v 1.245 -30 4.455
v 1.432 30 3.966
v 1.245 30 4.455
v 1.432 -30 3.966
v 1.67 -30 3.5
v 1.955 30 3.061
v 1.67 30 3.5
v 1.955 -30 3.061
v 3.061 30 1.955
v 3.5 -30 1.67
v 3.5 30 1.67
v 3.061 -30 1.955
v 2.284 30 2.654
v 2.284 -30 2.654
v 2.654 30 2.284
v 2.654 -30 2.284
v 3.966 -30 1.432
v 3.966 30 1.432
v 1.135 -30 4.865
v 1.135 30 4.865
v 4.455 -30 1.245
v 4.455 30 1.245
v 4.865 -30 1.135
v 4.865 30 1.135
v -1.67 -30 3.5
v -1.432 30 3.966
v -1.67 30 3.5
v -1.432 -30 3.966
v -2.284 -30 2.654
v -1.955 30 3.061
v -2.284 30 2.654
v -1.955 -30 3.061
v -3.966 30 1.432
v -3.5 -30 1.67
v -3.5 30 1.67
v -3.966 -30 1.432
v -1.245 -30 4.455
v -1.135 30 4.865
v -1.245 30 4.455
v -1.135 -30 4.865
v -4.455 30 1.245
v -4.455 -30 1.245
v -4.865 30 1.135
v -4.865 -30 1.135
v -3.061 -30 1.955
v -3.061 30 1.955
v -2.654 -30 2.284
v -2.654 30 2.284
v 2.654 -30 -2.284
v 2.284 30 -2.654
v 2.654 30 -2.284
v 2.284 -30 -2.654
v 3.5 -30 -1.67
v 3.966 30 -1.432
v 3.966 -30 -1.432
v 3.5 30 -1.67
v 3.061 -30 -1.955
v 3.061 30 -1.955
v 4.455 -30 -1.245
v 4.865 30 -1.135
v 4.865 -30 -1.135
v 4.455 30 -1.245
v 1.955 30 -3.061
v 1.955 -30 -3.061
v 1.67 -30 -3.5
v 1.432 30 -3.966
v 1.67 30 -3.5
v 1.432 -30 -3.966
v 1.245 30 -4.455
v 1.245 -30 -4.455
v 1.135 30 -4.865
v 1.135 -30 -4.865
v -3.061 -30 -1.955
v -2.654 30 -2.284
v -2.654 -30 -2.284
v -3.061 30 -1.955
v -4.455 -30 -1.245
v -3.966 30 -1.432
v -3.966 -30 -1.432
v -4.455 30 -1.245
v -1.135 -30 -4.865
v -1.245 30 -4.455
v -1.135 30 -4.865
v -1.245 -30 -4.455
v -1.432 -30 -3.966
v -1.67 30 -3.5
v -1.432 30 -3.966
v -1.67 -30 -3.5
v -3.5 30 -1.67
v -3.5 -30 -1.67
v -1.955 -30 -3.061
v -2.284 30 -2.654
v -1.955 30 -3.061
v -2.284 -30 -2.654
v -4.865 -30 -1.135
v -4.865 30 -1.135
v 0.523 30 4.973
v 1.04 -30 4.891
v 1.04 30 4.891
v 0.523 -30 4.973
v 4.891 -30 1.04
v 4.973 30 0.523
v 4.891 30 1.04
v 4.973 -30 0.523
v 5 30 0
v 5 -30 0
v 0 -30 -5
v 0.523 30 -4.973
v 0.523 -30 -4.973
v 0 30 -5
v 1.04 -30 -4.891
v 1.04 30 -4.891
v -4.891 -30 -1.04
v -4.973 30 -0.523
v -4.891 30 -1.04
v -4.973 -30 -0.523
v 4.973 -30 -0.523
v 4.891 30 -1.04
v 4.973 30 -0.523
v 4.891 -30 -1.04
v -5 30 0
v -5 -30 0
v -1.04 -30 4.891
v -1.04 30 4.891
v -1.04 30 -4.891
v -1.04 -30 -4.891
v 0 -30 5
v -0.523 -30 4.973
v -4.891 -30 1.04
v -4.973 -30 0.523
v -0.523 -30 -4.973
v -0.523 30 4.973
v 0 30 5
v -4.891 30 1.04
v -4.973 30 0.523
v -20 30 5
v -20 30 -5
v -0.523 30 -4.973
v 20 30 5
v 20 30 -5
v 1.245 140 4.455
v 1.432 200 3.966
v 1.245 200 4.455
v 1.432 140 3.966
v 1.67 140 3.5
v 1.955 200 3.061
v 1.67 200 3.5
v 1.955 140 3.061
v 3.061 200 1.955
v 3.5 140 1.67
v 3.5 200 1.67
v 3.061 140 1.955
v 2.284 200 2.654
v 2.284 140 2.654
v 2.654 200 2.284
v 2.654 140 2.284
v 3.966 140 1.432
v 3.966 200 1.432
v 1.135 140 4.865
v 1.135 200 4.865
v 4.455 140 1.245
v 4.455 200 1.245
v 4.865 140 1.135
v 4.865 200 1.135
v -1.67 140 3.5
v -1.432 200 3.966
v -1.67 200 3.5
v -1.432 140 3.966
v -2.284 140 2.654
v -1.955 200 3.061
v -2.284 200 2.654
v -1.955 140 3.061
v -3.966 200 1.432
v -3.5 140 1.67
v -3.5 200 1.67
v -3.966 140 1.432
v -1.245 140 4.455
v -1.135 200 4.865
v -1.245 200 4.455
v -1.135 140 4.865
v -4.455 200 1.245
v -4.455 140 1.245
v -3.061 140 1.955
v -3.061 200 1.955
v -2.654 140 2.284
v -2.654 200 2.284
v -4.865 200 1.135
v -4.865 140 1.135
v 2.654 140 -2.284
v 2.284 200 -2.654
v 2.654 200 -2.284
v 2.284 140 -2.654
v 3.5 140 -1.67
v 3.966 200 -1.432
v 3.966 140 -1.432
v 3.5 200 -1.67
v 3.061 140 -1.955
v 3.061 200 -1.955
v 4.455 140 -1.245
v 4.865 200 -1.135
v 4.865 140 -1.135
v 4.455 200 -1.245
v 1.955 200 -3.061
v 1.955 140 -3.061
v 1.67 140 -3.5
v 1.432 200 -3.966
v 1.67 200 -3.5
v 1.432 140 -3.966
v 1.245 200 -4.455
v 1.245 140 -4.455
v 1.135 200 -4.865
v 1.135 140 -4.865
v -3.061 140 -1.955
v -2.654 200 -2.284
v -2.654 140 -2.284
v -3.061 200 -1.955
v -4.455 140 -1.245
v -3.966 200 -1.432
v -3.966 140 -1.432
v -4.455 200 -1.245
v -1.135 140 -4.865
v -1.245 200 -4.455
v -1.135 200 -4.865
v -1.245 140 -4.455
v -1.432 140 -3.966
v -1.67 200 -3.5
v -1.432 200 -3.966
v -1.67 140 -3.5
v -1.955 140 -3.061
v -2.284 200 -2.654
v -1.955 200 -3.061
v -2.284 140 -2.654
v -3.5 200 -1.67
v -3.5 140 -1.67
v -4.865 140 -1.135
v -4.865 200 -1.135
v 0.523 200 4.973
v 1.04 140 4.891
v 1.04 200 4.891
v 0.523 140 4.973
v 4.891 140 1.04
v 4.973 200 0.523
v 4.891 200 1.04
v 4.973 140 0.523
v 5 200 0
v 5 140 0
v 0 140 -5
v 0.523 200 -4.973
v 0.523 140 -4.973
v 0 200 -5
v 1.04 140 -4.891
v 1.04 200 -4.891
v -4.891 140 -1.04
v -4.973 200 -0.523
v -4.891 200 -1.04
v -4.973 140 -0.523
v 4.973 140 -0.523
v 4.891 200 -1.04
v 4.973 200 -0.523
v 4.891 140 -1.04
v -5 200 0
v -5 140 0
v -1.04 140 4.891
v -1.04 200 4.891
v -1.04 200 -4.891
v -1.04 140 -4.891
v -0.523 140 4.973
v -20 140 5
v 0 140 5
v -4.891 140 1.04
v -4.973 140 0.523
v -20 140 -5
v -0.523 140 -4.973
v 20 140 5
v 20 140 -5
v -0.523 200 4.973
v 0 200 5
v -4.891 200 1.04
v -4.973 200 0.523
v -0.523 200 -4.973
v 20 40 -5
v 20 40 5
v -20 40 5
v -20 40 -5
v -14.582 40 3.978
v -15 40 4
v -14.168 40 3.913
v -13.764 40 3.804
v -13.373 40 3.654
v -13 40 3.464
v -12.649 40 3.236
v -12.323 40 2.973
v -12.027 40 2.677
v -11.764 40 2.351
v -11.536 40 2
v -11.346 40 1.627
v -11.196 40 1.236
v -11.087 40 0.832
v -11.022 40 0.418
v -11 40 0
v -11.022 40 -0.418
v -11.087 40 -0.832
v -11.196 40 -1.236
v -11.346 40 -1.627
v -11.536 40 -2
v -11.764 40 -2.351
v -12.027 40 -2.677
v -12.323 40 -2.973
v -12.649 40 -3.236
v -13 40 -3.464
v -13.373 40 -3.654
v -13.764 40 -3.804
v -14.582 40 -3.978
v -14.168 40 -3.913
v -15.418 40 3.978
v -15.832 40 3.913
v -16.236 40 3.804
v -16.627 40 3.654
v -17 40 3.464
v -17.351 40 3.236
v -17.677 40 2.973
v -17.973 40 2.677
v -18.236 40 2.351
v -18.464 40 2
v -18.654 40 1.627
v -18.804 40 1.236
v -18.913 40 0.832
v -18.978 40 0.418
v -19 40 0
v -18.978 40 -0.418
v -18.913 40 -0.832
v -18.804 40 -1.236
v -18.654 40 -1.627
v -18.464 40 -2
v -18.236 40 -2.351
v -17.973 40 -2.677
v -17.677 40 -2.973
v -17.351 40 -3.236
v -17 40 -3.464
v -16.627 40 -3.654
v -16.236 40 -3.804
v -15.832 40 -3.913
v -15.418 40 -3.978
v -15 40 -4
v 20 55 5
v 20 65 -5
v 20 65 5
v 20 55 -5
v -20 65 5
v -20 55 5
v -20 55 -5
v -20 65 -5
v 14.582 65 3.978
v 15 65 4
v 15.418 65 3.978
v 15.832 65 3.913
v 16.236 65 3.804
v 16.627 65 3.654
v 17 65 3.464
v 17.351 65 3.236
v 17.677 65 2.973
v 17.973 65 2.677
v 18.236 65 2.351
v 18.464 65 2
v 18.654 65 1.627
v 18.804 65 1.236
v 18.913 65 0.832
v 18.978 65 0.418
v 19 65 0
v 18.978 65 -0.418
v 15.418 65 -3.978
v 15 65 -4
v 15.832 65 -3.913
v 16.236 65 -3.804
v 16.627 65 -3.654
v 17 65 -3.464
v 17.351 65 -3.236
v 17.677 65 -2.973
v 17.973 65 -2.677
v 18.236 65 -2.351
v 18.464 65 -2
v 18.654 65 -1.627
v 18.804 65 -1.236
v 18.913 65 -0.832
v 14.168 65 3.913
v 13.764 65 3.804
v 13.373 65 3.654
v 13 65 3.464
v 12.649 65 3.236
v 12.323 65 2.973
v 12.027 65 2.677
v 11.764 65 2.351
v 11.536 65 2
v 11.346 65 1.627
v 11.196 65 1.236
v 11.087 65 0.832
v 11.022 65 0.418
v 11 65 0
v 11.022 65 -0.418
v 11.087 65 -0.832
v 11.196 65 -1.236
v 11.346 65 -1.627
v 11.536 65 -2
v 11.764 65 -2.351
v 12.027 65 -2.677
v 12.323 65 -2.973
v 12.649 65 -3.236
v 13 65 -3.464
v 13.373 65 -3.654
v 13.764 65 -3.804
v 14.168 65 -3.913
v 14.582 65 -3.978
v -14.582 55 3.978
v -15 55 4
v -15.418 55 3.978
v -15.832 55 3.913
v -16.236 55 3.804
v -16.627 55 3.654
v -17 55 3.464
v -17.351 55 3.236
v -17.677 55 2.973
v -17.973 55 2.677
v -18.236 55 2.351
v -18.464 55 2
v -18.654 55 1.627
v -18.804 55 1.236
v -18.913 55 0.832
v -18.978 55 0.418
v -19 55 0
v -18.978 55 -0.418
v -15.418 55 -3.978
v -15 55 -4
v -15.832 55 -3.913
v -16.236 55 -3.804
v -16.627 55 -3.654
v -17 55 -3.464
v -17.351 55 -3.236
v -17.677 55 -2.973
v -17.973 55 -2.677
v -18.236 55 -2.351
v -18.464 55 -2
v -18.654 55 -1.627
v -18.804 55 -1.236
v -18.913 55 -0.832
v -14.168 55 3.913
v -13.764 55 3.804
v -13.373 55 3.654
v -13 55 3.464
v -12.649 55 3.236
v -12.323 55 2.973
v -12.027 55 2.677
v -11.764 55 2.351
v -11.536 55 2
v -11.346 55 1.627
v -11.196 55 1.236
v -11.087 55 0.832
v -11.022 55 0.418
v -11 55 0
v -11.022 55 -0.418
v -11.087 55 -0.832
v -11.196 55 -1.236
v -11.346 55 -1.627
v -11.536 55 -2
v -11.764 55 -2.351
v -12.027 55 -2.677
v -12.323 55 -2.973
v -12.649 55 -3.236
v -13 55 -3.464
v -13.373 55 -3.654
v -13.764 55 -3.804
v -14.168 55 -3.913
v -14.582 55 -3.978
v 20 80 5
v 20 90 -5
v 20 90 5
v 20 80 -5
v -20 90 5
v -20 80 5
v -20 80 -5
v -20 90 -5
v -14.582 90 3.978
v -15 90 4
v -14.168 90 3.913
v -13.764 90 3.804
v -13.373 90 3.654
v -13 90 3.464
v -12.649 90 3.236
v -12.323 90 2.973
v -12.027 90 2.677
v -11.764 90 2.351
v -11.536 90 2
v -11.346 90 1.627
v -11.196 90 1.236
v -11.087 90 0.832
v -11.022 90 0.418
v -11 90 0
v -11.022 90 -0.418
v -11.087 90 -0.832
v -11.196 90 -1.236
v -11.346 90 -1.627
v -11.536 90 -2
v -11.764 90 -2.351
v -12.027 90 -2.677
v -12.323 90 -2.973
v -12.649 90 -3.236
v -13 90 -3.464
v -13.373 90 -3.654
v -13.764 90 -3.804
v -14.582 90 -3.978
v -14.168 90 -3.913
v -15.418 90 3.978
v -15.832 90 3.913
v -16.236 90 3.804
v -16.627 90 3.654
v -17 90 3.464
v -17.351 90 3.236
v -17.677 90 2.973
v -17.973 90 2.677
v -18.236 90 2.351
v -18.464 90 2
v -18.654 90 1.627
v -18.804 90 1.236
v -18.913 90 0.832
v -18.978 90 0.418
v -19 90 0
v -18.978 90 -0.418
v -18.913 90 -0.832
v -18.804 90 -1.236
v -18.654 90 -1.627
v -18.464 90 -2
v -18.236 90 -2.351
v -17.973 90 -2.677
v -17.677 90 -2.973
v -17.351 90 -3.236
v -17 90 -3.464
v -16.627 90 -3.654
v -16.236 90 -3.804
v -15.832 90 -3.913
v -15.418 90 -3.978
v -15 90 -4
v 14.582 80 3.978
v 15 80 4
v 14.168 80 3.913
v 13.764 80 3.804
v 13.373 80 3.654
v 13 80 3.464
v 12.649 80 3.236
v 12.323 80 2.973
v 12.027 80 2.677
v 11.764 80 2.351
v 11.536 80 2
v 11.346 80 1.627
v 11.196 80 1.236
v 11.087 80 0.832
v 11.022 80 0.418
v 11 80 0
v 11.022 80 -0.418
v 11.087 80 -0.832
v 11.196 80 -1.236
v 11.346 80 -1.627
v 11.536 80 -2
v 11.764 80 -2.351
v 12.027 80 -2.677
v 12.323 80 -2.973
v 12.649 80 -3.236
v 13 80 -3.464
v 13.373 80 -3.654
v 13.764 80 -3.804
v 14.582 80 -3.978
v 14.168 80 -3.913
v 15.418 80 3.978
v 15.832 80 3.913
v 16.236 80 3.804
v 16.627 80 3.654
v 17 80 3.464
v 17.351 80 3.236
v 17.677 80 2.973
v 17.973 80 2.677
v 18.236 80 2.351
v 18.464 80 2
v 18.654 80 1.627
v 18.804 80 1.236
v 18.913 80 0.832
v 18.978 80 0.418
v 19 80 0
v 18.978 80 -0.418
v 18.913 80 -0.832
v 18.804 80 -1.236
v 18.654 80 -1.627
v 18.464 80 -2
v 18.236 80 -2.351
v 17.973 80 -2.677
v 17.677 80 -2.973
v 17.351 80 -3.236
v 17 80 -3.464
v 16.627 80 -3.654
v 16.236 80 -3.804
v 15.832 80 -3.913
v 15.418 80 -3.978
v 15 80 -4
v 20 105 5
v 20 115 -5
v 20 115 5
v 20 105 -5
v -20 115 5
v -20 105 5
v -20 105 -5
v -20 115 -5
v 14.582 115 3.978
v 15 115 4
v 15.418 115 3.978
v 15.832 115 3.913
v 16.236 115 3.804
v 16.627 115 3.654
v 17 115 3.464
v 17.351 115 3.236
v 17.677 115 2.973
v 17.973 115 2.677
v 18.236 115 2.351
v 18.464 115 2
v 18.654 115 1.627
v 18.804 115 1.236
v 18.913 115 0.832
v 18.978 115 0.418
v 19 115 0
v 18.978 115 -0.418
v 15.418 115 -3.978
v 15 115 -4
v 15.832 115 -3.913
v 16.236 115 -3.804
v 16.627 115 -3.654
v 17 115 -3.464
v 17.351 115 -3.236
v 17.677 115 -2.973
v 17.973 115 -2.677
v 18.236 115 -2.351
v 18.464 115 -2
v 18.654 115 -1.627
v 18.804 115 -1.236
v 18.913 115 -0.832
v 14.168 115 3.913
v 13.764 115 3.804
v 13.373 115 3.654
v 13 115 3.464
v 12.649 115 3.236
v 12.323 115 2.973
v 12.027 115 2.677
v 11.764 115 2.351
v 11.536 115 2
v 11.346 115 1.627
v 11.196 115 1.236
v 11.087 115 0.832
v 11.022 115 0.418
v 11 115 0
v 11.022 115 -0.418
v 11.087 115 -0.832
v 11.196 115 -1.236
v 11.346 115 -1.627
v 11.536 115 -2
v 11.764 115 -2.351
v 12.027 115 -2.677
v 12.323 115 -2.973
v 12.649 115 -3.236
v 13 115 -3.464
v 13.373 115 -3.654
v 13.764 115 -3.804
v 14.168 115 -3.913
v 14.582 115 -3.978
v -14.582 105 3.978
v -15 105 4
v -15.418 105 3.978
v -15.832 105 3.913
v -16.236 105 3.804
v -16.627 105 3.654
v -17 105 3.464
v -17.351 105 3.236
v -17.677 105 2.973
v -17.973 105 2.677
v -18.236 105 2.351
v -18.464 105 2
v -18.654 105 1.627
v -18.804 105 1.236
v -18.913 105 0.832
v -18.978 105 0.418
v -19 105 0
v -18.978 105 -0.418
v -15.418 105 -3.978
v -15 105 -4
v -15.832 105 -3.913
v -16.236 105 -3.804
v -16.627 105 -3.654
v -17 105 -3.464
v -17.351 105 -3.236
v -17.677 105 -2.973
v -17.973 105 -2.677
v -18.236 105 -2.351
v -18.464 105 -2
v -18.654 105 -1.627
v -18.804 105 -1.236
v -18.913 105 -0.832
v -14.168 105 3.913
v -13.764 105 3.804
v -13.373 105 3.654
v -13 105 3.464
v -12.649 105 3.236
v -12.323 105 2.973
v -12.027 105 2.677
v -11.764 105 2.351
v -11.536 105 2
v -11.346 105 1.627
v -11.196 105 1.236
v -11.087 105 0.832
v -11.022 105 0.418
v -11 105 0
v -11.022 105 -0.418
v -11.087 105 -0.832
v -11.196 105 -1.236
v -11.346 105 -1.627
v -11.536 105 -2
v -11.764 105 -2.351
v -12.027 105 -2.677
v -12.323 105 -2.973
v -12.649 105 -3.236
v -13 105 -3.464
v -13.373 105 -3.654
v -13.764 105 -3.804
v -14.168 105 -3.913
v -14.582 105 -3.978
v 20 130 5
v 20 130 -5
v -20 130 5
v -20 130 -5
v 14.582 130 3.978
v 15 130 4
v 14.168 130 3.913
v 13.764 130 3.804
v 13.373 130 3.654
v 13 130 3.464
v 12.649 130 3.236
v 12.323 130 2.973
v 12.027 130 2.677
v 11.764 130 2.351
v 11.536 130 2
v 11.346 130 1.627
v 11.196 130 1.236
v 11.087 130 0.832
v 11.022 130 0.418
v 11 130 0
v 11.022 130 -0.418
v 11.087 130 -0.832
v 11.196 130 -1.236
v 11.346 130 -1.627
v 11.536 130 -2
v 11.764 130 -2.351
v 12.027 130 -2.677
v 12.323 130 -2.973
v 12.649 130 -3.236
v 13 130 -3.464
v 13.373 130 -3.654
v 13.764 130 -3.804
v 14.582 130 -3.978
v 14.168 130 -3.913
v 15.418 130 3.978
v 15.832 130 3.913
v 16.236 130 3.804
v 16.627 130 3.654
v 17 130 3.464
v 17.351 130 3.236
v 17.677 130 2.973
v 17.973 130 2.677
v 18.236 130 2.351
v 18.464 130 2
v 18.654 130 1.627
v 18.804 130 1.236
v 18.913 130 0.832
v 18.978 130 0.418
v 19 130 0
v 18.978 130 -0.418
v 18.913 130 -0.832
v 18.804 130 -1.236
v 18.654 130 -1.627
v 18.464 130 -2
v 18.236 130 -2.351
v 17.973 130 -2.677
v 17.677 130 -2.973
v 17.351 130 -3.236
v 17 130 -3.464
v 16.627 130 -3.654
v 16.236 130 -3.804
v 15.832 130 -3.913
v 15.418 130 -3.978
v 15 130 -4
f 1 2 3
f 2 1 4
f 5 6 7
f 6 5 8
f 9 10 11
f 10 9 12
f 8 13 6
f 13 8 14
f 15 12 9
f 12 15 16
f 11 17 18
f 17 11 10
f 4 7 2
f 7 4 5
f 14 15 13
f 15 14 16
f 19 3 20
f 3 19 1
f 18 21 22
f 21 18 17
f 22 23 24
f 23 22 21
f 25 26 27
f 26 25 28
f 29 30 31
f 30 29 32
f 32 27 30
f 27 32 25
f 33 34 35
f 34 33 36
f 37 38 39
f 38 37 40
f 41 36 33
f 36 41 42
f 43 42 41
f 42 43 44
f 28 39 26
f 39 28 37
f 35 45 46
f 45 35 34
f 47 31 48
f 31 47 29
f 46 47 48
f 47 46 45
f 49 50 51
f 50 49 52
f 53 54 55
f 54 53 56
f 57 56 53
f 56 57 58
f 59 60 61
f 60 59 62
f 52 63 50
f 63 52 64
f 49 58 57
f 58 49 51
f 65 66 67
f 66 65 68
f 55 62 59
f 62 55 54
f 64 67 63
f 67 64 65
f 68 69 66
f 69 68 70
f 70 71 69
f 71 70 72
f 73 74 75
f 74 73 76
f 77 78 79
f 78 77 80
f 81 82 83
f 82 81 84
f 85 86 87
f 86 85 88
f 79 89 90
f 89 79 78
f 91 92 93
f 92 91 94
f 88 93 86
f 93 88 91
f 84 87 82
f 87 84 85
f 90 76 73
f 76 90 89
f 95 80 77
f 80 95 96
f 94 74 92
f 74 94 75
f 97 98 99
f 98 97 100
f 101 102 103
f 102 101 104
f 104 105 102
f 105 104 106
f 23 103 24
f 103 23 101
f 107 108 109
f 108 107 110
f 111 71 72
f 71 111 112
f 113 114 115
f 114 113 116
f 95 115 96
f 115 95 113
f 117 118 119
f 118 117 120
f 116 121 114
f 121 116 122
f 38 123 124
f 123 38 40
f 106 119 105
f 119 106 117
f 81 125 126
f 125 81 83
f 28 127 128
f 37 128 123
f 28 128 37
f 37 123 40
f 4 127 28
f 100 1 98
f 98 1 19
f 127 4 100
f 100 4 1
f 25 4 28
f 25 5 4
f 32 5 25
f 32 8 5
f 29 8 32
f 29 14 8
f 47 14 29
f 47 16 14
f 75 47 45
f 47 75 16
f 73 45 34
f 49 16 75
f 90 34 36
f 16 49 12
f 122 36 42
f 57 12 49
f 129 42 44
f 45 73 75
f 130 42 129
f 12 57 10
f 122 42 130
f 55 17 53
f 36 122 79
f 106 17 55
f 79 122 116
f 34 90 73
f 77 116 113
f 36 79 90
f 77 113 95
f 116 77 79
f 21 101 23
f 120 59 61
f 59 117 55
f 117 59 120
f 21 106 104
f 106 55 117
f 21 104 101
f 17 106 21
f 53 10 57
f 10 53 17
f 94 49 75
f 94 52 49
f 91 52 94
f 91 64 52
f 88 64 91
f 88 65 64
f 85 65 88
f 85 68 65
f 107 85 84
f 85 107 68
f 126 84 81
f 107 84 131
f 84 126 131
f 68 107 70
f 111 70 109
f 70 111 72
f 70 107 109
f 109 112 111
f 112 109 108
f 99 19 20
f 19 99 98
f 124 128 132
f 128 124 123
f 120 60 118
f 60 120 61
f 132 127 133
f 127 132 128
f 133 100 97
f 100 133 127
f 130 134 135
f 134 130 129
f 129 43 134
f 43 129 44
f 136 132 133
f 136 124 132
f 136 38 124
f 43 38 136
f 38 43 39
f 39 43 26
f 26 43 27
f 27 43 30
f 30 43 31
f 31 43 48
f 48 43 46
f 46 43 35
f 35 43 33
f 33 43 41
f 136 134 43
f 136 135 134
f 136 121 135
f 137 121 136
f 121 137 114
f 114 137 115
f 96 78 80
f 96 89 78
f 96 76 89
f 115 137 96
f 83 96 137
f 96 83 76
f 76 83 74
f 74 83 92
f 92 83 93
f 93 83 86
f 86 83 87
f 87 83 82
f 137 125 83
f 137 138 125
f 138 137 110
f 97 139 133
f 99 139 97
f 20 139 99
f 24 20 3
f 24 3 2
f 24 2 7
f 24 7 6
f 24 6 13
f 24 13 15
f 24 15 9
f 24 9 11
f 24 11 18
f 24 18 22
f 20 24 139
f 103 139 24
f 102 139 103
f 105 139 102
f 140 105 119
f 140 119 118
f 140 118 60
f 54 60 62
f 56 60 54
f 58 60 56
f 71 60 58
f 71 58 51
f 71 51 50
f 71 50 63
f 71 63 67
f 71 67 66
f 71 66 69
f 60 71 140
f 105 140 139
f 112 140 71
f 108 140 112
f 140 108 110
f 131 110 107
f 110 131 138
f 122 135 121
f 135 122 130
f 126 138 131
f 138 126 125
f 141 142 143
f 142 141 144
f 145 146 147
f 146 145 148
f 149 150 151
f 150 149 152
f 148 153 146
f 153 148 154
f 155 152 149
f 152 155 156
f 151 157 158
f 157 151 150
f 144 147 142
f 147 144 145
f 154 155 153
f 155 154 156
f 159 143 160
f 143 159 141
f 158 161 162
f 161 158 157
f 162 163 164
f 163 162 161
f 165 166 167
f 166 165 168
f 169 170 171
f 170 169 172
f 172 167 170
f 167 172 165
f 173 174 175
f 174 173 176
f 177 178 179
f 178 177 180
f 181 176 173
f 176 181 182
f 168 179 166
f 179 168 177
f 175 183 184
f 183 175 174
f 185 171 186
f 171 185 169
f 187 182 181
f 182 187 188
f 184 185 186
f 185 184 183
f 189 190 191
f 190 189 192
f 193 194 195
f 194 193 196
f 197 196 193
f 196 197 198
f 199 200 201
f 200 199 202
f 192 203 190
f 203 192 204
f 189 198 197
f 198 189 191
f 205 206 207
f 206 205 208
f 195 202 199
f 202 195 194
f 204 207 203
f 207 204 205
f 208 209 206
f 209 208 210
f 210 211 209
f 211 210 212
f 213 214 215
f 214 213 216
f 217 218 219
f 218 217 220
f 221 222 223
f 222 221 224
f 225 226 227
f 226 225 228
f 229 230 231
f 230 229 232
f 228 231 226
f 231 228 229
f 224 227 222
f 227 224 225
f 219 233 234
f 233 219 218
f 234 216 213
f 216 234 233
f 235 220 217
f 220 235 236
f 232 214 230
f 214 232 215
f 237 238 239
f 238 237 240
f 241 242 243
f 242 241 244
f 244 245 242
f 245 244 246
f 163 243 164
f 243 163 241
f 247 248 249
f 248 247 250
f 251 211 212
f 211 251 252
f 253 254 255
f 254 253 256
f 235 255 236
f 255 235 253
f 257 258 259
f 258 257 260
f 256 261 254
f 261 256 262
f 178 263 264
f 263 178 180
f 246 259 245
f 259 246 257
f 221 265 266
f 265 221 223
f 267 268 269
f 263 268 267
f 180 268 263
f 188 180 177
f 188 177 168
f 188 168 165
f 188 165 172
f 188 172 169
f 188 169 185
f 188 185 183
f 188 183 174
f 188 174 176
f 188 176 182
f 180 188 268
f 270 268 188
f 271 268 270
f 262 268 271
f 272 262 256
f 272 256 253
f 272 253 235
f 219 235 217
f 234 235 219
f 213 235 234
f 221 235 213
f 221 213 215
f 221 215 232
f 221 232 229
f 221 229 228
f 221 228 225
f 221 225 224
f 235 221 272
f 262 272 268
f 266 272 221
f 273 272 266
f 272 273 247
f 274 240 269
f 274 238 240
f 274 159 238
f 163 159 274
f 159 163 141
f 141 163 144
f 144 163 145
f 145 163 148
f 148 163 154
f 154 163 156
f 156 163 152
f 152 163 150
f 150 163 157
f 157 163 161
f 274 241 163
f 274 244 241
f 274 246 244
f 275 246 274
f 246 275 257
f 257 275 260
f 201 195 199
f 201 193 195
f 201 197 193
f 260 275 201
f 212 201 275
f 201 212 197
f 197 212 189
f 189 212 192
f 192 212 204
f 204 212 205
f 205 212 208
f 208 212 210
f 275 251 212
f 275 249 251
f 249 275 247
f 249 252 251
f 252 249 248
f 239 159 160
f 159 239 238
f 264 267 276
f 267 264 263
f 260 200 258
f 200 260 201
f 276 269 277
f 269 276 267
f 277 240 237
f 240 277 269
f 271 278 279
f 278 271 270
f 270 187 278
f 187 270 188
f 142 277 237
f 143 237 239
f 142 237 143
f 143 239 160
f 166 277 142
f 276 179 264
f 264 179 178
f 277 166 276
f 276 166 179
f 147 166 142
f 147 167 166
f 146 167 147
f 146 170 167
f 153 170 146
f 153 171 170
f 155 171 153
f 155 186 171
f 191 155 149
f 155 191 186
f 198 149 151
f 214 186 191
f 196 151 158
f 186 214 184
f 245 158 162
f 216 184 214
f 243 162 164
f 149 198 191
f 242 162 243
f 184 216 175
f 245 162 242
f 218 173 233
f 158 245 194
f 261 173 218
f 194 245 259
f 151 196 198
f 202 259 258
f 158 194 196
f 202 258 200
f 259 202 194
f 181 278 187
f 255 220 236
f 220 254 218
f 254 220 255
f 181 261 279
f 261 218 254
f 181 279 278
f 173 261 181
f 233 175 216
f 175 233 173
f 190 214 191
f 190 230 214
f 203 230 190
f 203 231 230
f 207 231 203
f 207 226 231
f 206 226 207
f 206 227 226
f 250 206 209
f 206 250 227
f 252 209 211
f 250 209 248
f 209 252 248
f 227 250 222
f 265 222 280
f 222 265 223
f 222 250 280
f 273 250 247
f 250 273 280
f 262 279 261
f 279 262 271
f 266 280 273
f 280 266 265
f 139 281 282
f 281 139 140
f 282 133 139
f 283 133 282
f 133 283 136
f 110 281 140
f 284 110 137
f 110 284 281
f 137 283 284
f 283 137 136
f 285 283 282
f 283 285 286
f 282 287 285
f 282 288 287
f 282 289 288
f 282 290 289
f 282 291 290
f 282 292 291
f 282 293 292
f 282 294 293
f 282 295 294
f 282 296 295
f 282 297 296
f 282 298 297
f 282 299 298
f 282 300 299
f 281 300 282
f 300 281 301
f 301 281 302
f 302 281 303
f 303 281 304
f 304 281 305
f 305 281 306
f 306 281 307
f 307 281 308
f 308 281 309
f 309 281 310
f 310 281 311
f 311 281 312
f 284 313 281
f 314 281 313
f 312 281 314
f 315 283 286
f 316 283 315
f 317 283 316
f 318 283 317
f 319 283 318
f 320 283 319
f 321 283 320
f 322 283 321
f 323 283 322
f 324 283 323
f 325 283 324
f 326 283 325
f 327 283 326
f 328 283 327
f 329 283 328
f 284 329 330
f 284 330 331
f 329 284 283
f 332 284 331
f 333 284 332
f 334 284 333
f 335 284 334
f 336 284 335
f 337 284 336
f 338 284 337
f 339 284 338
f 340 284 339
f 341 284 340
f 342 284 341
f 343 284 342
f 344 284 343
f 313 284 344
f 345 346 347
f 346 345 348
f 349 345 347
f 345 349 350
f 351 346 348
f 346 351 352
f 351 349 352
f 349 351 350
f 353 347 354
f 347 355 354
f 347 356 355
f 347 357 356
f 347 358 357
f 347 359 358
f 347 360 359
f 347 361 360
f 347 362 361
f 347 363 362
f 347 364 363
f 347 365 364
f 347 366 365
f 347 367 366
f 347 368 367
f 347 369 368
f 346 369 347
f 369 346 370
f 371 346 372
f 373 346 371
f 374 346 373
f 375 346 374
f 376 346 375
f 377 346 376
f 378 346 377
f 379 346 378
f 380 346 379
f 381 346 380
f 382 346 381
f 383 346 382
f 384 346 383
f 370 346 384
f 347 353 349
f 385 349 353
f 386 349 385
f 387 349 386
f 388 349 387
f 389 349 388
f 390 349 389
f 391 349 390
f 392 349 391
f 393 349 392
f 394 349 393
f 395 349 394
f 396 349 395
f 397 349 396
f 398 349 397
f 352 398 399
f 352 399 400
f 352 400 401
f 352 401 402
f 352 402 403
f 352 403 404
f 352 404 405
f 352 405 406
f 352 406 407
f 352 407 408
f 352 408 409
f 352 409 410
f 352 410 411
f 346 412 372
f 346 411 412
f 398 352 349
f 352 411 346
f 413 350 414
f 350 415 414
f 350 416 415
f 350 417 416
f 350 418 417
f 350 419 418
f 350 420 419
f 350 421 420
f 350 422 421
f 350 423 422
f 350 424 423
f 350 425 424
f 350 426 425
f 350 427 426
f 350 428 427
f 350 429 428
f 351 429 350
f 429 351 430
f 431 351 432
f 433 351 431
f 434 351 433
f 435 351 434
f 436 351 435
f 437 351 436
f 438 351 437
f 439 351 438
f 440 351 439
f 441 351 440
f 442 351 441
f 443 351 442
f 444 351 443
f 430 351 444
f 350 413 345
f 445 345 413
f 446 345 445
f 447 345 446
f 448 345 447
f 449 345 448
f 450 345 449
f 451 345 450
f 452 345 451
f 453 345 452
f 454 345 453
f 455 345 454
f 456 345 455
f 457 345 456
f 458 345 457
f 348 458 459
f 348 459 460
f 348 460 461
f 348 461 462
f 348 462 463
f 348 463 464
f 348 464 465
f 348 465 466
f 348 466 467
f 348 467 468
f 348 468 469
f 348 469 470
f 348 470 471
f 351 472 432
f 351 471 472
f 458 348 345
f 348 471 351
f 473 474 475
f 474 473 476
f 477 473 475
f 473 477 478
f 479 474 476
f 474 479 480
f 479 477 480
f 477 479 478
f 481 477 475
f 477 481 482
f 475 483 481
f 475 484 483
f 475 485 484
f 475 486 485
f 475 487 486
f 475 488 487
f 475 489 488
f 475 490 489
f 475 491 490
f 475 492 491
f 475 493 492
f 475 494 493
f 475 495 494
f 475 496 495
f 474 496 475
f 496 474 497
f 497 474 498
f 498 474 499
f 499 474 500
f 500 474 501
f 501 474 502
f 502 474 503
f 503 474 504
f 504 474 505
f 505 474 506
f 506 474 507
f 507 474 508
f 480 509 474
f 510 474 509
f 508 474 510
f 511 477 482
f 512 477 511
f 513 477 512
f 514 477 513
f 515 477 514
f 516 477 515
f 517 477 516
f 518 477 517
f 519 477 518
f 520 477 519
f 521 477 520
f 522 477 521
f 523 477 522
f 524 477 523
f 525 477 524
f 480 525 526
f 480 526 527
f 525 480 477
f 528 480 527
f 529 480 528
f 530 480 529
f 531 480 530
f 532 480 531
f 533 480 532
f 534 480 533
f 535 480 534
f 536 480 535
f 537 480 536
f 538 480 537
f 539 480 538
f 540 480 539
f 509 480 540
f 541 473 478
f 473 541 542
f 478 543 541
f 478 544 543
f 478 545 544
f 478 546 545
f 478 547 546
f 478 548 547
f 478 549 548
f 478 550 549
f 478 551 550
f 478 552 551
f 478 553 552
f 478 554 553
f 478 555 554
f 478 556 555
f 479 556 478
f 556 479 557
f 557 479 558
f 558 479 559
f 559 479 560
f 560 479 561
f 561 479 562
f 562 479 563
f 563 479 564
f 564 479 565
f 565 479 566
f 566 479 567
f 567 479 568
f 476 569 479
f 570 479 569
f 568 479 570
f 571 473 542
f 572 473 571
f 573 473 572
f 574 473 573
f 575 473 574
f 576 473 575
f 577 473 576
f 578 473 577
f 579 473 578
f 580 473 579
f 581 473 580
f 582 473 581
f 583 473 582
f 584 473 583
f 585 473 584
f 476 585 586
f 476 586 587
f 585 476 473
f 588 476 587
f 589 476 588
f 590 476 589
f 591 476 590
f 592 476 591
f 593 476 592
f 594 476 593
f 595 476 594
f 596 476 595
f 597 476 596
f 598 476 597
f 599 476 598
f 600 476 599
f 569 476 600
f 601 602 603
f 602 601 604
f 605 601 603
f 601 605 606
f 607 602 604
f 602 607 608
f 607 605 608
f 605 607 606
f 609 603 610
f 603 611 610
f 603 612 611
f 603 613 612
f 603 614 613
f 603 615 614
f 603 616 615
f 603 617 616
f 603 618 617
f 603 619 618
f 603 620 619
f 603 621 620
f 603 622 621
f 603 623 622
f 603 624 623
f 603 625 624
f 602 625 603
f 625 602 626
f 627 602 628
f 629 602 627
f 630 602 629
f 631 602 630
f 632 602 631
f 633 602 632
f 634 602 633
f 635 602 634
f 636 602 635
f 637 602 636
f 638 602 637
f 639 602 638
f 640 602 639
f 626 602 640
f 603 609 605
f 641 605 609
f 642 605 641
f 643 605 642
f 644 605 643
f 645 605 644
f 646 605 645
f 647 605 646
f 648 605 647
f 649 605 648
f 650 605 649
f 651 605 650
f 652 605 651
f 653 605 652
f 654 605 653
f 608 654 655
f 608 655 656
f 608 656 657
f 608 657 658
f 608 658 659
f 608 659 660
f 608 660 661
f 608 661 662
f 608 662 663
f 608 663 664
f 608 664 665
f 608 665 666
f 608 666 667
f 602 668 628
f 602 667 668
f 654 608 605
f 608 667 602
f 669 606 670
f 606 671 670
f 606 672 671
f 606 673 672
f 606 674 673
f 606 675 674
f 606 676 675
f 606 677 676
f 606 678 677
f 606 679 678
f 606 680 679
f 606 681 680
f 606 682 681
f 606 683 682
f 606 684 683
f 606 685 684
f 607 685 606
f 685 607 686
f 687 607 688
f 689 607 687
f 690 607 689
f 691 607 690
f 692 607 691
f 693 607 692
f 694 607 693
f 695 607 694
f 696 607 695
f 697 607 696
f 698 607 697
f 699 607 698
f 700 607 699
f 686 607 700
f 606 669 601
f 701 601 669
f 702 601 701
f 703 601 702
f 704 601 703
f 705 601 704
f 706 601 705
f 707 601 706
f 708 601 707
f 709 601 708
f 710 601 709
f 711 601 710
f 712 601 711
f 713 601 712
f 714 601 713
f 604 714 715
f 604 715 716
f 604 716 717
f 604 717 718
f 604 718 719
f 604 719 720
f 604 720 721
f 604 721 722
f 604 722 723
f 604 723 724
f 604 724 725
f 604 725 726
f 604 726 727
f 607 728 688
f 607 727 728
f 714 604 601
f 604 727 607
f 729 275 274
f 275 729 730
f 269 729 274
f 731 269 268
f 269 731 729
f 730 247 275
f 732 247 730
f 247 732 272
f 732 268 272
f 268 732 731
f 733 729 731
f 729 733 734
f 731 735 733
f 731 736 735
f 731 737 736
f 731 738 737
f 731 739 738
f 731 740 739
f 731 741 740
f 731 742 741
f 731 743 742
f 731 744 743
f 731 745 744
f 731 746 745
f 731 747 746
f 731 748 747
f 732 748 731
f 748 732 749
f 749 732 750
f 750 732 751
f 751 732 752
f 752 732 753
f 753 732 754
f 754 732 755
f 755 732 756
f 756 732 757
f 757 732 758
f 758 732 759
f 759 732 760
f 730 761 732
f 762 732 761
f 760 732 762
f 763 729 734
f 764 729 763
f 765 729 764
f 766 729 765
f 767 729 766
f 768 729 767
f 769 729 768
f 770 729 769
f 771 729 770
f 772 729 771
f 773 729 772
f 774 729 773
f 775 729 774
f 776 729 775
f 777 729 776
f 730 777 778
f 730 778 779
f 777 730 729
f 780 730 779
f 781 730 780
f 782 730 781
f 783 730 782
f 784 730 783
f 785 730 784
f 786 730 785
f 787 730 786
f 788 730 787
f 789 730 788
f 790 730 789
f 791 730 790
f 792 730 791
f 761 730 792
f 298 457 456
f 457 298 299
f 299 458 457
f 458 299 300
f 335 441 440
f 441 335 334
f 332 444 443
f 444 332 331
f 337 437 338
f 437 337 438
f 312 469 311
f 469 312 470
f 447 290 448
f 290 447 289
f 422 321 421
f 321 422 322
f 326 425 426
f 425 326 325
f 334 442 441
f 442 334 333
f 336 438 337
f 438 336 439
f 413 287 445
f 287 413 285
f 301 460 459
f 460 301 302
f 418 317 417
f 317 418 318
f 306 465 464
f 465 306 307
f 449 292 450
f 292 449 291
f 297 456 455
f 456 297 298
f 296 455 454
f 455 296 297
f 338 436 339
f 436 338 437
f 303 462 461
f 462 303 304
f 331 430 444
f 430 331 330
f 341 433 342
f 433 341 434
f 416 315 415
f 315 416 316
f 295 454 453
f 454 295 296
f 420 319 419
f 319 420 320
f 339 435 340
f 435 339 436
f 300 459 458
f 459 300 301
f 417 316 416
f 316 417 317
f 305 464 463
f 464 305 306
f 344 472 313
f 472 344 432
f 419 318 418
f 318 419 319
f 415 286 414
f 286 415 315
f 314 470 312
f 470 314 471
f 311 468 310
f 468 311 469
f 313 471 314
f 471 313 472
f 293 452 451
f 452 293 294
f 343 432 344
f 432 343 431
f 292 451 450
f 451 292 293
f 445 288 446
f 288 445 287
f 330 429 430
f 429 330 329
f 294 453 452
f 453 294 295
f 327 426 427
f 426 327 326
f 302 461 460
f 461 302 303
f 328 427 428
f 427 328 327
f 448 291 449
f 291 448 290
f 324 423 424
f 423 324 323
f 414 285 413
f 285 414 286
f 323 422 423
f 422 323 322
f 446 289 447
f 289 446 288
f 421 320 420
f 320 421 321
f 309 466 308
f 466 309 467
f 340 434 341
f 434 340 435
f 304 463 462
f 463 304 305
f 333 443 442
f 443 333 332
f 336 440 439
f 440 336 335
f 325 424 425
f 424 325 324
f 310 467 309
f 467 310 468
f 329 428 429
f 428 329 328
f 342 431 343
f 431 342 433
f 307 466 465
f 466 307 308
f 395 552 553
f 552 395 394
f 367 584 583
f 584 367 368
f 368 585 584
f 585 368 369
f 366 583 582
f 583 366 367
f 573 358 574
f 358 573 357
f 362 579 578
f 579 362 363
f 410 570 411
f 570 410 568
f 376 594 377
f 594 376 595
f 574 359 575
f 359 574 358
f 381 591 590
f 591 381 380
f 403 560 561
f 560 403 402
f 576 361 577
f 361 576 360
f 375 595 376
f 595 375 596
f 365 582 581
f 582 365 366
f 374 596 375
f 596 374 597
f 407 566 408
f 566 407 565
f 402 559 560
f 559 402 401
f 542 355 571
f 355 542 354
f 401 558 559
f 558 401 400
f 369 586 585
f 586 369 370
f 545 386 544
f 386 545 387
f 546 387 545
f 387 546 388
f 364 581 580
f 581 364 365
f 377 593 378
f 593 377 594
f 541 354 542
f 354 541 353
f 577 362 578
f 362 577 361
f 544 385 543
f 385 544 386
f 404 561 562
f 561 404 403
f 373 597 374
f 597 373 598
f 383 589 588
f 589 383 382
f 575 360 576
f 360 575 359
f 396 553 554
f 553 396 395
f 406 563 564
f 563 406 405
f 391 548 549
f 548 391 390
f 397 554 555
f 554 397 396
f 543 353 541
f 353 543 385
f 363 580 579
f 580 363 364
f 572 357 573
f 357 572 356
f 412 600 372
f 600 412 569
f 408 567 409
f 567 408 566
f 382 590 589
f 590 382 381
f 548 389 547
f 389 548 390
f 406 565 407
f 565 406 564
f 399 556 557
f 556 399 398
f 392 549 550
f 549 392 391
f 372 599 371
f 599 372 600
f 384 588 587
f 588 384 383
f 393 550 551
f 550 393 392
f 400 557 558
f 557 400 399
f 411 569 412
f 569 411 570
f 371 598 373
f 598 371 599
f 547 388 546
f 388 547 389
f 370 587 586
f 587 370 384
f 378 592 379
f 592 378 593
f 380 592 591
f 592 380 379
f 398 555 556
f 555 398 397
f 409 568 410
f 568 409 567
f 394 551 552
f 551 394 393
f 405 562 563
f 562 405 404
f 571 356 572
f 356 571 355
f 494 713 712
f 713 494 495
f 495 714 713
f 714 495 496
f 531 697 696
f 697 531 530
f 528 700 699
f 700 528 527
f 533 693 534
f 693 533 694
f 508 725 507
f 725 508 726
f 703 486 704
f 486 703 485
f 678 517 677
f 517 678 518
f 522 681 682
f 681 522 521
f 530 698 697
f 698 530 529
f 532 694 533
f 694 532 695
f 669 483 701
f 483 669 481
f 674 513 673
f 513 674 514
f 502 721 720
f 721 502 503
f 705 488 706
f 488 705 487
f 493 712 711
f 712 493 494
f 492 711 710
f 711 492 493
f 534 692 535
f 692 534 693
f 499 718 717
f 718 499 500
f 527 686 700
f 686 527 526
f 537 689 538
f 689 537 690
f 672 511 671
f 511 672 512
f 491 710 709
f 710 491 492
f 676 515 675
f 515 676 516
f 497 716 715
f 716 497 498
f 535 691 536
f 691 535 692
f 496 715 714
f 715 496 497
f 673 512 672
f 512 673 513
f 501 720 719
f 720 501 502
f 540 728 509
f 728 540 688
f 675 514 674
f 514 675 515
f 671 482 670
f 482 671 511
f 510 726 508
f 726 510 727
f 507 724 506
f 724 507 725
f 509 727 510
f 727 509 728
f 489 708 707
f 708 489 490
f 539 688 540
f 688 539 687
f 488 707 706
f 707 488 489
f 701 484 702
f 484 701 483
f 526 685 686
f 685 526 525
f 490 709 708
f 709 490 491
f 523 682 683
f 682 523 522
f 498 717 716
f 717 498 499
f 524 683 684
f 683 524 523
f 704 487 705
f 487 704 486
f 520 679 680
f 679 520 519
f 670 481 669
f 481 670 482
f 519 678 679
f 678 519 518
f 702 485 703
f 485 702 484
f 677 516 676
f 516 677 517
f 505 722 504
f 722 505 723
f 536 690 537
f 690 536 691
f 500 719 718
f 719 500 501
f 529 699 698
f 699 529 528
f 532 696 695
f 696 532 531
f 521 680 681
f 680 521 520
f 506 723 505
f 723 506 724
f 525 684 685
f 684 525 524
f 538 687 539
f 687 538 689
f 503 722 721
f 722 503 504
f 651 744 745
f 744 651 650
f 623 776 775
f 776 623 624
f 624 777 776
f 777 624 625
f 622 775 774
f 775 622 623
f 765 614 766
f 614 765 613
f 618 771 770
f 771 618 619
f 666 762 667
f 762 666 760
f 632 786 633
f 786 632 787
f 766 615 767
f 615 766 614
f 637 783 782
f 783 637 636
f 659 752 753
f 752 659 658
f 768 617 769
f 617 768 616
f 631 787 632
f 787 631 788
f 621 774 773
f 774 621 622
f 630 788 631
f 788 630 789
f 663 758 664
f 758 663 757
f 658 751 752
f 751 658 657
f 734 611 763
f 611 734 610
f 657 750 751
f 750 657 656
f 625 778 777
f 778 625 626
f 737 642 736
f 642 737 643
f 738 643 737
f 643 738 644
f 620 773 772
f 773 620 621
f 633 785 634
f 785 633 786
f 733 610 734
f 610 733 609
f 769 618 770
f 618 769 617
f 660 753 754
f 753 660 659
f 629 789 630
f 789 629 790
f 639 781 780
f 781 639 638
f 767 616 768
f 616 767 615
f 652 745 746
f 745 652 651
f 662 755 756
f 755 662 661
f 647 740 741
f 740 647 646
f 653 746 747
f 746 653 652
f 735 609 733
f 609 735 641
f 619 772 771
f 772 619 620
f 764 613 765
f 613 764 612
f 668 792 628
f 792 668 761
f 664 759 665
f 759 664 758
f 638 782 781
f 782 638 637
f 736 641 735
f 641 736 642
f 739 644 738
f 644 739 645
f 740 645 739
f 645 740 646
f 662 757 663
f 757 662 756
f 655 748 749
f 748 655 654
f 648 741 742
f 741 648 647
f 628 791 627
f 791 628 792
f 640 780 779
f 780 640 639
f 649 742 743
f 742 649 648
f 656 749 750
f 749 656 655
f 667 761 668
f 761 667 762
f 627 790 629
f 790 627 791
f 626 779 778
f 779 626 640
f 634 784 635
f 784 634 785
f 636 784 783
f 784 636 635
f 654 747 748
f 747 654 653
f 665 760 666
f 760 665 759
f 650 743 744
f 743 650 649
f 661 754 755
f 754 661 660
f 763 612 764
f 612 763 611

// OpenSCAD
//ball_dia = 10;

//Step Stats
step_width = 0;
step_amounts = 4;

//Main Bar
bar_r = 5;
bar_l = 60;
indent_dis = bar_r*1.2;

//Joint
joint_dis = 25;
joint_cube = [bar_r*8, bar_r*2, bar_r*2];
joint_bar_l = joint_dis - joint_cube[1];

//Joint Bar
joint_bar_r = bar_r*0.8;

//End Main Bar
joint_amounts = step_amounts > 0 ? step_amounts+1 : step_amounts;
bar_end_dis=  bar_l + joint_amounts*joint_cube[1] + step_amounts*joint_bar_l;;


// ---------------STARTING SHAPES---------------

//Start Bar
difference(){
    //Main Bar
    rotate(a = [90,0,0])cylinder(r=bar_r, h=bar_l, $fn=60, center=true);
    
    //Indents
    k = indent_dis;
    for(i = [[k,k],[-k,k],[k,-k],[-k,-k]]){
        translate([i[0], 0, i[1]])
            rotate(a = [90,0,0])cylinder(r=bar_r, h=bar_l*2, $fn=60, center=true);
    }
}

//End Bar
difference(){
    //Main Bar
    translate([0,bar_end_dis,0])
        rotate(a = [90,0,0])cylinder(r=bar_r, h=bar_l, $fn=60, center=true);
    
    //Indents
    k = indent_dis;
    for(i = [[k,k],[-k,k],[k,-k],[-k,-k]]){
        translate([i[0], bar_end_dis, i[1]])
            rotate(a = [90,0,0])cylinder(r=bar_r, h=bar_l*2, $fn=60, center=true);
    }
}

//Joints Cubes
if(step_amounts > 0){
    for(i = [0 : step_amounts]){
        translate([0, bar_l/2+joint_cube[1]/2+joint_dis*i, 0])
            cube(joint_cube, center=true);
    }
}

//Joint Bars
if(step_amounts > 0){
    for(i = [1 : step_amounts]){
        side = i%2 == 0 ? bar_r*3 : -bar_r*3;
        translate([side, bar_l/2+joint_dis*i-joint_bar_l/2, 0])
            rotate(a = [90,0,0])cylinder(r=joint_bar_r, h=joint_bar_l, $fn=60, center=true);
    }
}
